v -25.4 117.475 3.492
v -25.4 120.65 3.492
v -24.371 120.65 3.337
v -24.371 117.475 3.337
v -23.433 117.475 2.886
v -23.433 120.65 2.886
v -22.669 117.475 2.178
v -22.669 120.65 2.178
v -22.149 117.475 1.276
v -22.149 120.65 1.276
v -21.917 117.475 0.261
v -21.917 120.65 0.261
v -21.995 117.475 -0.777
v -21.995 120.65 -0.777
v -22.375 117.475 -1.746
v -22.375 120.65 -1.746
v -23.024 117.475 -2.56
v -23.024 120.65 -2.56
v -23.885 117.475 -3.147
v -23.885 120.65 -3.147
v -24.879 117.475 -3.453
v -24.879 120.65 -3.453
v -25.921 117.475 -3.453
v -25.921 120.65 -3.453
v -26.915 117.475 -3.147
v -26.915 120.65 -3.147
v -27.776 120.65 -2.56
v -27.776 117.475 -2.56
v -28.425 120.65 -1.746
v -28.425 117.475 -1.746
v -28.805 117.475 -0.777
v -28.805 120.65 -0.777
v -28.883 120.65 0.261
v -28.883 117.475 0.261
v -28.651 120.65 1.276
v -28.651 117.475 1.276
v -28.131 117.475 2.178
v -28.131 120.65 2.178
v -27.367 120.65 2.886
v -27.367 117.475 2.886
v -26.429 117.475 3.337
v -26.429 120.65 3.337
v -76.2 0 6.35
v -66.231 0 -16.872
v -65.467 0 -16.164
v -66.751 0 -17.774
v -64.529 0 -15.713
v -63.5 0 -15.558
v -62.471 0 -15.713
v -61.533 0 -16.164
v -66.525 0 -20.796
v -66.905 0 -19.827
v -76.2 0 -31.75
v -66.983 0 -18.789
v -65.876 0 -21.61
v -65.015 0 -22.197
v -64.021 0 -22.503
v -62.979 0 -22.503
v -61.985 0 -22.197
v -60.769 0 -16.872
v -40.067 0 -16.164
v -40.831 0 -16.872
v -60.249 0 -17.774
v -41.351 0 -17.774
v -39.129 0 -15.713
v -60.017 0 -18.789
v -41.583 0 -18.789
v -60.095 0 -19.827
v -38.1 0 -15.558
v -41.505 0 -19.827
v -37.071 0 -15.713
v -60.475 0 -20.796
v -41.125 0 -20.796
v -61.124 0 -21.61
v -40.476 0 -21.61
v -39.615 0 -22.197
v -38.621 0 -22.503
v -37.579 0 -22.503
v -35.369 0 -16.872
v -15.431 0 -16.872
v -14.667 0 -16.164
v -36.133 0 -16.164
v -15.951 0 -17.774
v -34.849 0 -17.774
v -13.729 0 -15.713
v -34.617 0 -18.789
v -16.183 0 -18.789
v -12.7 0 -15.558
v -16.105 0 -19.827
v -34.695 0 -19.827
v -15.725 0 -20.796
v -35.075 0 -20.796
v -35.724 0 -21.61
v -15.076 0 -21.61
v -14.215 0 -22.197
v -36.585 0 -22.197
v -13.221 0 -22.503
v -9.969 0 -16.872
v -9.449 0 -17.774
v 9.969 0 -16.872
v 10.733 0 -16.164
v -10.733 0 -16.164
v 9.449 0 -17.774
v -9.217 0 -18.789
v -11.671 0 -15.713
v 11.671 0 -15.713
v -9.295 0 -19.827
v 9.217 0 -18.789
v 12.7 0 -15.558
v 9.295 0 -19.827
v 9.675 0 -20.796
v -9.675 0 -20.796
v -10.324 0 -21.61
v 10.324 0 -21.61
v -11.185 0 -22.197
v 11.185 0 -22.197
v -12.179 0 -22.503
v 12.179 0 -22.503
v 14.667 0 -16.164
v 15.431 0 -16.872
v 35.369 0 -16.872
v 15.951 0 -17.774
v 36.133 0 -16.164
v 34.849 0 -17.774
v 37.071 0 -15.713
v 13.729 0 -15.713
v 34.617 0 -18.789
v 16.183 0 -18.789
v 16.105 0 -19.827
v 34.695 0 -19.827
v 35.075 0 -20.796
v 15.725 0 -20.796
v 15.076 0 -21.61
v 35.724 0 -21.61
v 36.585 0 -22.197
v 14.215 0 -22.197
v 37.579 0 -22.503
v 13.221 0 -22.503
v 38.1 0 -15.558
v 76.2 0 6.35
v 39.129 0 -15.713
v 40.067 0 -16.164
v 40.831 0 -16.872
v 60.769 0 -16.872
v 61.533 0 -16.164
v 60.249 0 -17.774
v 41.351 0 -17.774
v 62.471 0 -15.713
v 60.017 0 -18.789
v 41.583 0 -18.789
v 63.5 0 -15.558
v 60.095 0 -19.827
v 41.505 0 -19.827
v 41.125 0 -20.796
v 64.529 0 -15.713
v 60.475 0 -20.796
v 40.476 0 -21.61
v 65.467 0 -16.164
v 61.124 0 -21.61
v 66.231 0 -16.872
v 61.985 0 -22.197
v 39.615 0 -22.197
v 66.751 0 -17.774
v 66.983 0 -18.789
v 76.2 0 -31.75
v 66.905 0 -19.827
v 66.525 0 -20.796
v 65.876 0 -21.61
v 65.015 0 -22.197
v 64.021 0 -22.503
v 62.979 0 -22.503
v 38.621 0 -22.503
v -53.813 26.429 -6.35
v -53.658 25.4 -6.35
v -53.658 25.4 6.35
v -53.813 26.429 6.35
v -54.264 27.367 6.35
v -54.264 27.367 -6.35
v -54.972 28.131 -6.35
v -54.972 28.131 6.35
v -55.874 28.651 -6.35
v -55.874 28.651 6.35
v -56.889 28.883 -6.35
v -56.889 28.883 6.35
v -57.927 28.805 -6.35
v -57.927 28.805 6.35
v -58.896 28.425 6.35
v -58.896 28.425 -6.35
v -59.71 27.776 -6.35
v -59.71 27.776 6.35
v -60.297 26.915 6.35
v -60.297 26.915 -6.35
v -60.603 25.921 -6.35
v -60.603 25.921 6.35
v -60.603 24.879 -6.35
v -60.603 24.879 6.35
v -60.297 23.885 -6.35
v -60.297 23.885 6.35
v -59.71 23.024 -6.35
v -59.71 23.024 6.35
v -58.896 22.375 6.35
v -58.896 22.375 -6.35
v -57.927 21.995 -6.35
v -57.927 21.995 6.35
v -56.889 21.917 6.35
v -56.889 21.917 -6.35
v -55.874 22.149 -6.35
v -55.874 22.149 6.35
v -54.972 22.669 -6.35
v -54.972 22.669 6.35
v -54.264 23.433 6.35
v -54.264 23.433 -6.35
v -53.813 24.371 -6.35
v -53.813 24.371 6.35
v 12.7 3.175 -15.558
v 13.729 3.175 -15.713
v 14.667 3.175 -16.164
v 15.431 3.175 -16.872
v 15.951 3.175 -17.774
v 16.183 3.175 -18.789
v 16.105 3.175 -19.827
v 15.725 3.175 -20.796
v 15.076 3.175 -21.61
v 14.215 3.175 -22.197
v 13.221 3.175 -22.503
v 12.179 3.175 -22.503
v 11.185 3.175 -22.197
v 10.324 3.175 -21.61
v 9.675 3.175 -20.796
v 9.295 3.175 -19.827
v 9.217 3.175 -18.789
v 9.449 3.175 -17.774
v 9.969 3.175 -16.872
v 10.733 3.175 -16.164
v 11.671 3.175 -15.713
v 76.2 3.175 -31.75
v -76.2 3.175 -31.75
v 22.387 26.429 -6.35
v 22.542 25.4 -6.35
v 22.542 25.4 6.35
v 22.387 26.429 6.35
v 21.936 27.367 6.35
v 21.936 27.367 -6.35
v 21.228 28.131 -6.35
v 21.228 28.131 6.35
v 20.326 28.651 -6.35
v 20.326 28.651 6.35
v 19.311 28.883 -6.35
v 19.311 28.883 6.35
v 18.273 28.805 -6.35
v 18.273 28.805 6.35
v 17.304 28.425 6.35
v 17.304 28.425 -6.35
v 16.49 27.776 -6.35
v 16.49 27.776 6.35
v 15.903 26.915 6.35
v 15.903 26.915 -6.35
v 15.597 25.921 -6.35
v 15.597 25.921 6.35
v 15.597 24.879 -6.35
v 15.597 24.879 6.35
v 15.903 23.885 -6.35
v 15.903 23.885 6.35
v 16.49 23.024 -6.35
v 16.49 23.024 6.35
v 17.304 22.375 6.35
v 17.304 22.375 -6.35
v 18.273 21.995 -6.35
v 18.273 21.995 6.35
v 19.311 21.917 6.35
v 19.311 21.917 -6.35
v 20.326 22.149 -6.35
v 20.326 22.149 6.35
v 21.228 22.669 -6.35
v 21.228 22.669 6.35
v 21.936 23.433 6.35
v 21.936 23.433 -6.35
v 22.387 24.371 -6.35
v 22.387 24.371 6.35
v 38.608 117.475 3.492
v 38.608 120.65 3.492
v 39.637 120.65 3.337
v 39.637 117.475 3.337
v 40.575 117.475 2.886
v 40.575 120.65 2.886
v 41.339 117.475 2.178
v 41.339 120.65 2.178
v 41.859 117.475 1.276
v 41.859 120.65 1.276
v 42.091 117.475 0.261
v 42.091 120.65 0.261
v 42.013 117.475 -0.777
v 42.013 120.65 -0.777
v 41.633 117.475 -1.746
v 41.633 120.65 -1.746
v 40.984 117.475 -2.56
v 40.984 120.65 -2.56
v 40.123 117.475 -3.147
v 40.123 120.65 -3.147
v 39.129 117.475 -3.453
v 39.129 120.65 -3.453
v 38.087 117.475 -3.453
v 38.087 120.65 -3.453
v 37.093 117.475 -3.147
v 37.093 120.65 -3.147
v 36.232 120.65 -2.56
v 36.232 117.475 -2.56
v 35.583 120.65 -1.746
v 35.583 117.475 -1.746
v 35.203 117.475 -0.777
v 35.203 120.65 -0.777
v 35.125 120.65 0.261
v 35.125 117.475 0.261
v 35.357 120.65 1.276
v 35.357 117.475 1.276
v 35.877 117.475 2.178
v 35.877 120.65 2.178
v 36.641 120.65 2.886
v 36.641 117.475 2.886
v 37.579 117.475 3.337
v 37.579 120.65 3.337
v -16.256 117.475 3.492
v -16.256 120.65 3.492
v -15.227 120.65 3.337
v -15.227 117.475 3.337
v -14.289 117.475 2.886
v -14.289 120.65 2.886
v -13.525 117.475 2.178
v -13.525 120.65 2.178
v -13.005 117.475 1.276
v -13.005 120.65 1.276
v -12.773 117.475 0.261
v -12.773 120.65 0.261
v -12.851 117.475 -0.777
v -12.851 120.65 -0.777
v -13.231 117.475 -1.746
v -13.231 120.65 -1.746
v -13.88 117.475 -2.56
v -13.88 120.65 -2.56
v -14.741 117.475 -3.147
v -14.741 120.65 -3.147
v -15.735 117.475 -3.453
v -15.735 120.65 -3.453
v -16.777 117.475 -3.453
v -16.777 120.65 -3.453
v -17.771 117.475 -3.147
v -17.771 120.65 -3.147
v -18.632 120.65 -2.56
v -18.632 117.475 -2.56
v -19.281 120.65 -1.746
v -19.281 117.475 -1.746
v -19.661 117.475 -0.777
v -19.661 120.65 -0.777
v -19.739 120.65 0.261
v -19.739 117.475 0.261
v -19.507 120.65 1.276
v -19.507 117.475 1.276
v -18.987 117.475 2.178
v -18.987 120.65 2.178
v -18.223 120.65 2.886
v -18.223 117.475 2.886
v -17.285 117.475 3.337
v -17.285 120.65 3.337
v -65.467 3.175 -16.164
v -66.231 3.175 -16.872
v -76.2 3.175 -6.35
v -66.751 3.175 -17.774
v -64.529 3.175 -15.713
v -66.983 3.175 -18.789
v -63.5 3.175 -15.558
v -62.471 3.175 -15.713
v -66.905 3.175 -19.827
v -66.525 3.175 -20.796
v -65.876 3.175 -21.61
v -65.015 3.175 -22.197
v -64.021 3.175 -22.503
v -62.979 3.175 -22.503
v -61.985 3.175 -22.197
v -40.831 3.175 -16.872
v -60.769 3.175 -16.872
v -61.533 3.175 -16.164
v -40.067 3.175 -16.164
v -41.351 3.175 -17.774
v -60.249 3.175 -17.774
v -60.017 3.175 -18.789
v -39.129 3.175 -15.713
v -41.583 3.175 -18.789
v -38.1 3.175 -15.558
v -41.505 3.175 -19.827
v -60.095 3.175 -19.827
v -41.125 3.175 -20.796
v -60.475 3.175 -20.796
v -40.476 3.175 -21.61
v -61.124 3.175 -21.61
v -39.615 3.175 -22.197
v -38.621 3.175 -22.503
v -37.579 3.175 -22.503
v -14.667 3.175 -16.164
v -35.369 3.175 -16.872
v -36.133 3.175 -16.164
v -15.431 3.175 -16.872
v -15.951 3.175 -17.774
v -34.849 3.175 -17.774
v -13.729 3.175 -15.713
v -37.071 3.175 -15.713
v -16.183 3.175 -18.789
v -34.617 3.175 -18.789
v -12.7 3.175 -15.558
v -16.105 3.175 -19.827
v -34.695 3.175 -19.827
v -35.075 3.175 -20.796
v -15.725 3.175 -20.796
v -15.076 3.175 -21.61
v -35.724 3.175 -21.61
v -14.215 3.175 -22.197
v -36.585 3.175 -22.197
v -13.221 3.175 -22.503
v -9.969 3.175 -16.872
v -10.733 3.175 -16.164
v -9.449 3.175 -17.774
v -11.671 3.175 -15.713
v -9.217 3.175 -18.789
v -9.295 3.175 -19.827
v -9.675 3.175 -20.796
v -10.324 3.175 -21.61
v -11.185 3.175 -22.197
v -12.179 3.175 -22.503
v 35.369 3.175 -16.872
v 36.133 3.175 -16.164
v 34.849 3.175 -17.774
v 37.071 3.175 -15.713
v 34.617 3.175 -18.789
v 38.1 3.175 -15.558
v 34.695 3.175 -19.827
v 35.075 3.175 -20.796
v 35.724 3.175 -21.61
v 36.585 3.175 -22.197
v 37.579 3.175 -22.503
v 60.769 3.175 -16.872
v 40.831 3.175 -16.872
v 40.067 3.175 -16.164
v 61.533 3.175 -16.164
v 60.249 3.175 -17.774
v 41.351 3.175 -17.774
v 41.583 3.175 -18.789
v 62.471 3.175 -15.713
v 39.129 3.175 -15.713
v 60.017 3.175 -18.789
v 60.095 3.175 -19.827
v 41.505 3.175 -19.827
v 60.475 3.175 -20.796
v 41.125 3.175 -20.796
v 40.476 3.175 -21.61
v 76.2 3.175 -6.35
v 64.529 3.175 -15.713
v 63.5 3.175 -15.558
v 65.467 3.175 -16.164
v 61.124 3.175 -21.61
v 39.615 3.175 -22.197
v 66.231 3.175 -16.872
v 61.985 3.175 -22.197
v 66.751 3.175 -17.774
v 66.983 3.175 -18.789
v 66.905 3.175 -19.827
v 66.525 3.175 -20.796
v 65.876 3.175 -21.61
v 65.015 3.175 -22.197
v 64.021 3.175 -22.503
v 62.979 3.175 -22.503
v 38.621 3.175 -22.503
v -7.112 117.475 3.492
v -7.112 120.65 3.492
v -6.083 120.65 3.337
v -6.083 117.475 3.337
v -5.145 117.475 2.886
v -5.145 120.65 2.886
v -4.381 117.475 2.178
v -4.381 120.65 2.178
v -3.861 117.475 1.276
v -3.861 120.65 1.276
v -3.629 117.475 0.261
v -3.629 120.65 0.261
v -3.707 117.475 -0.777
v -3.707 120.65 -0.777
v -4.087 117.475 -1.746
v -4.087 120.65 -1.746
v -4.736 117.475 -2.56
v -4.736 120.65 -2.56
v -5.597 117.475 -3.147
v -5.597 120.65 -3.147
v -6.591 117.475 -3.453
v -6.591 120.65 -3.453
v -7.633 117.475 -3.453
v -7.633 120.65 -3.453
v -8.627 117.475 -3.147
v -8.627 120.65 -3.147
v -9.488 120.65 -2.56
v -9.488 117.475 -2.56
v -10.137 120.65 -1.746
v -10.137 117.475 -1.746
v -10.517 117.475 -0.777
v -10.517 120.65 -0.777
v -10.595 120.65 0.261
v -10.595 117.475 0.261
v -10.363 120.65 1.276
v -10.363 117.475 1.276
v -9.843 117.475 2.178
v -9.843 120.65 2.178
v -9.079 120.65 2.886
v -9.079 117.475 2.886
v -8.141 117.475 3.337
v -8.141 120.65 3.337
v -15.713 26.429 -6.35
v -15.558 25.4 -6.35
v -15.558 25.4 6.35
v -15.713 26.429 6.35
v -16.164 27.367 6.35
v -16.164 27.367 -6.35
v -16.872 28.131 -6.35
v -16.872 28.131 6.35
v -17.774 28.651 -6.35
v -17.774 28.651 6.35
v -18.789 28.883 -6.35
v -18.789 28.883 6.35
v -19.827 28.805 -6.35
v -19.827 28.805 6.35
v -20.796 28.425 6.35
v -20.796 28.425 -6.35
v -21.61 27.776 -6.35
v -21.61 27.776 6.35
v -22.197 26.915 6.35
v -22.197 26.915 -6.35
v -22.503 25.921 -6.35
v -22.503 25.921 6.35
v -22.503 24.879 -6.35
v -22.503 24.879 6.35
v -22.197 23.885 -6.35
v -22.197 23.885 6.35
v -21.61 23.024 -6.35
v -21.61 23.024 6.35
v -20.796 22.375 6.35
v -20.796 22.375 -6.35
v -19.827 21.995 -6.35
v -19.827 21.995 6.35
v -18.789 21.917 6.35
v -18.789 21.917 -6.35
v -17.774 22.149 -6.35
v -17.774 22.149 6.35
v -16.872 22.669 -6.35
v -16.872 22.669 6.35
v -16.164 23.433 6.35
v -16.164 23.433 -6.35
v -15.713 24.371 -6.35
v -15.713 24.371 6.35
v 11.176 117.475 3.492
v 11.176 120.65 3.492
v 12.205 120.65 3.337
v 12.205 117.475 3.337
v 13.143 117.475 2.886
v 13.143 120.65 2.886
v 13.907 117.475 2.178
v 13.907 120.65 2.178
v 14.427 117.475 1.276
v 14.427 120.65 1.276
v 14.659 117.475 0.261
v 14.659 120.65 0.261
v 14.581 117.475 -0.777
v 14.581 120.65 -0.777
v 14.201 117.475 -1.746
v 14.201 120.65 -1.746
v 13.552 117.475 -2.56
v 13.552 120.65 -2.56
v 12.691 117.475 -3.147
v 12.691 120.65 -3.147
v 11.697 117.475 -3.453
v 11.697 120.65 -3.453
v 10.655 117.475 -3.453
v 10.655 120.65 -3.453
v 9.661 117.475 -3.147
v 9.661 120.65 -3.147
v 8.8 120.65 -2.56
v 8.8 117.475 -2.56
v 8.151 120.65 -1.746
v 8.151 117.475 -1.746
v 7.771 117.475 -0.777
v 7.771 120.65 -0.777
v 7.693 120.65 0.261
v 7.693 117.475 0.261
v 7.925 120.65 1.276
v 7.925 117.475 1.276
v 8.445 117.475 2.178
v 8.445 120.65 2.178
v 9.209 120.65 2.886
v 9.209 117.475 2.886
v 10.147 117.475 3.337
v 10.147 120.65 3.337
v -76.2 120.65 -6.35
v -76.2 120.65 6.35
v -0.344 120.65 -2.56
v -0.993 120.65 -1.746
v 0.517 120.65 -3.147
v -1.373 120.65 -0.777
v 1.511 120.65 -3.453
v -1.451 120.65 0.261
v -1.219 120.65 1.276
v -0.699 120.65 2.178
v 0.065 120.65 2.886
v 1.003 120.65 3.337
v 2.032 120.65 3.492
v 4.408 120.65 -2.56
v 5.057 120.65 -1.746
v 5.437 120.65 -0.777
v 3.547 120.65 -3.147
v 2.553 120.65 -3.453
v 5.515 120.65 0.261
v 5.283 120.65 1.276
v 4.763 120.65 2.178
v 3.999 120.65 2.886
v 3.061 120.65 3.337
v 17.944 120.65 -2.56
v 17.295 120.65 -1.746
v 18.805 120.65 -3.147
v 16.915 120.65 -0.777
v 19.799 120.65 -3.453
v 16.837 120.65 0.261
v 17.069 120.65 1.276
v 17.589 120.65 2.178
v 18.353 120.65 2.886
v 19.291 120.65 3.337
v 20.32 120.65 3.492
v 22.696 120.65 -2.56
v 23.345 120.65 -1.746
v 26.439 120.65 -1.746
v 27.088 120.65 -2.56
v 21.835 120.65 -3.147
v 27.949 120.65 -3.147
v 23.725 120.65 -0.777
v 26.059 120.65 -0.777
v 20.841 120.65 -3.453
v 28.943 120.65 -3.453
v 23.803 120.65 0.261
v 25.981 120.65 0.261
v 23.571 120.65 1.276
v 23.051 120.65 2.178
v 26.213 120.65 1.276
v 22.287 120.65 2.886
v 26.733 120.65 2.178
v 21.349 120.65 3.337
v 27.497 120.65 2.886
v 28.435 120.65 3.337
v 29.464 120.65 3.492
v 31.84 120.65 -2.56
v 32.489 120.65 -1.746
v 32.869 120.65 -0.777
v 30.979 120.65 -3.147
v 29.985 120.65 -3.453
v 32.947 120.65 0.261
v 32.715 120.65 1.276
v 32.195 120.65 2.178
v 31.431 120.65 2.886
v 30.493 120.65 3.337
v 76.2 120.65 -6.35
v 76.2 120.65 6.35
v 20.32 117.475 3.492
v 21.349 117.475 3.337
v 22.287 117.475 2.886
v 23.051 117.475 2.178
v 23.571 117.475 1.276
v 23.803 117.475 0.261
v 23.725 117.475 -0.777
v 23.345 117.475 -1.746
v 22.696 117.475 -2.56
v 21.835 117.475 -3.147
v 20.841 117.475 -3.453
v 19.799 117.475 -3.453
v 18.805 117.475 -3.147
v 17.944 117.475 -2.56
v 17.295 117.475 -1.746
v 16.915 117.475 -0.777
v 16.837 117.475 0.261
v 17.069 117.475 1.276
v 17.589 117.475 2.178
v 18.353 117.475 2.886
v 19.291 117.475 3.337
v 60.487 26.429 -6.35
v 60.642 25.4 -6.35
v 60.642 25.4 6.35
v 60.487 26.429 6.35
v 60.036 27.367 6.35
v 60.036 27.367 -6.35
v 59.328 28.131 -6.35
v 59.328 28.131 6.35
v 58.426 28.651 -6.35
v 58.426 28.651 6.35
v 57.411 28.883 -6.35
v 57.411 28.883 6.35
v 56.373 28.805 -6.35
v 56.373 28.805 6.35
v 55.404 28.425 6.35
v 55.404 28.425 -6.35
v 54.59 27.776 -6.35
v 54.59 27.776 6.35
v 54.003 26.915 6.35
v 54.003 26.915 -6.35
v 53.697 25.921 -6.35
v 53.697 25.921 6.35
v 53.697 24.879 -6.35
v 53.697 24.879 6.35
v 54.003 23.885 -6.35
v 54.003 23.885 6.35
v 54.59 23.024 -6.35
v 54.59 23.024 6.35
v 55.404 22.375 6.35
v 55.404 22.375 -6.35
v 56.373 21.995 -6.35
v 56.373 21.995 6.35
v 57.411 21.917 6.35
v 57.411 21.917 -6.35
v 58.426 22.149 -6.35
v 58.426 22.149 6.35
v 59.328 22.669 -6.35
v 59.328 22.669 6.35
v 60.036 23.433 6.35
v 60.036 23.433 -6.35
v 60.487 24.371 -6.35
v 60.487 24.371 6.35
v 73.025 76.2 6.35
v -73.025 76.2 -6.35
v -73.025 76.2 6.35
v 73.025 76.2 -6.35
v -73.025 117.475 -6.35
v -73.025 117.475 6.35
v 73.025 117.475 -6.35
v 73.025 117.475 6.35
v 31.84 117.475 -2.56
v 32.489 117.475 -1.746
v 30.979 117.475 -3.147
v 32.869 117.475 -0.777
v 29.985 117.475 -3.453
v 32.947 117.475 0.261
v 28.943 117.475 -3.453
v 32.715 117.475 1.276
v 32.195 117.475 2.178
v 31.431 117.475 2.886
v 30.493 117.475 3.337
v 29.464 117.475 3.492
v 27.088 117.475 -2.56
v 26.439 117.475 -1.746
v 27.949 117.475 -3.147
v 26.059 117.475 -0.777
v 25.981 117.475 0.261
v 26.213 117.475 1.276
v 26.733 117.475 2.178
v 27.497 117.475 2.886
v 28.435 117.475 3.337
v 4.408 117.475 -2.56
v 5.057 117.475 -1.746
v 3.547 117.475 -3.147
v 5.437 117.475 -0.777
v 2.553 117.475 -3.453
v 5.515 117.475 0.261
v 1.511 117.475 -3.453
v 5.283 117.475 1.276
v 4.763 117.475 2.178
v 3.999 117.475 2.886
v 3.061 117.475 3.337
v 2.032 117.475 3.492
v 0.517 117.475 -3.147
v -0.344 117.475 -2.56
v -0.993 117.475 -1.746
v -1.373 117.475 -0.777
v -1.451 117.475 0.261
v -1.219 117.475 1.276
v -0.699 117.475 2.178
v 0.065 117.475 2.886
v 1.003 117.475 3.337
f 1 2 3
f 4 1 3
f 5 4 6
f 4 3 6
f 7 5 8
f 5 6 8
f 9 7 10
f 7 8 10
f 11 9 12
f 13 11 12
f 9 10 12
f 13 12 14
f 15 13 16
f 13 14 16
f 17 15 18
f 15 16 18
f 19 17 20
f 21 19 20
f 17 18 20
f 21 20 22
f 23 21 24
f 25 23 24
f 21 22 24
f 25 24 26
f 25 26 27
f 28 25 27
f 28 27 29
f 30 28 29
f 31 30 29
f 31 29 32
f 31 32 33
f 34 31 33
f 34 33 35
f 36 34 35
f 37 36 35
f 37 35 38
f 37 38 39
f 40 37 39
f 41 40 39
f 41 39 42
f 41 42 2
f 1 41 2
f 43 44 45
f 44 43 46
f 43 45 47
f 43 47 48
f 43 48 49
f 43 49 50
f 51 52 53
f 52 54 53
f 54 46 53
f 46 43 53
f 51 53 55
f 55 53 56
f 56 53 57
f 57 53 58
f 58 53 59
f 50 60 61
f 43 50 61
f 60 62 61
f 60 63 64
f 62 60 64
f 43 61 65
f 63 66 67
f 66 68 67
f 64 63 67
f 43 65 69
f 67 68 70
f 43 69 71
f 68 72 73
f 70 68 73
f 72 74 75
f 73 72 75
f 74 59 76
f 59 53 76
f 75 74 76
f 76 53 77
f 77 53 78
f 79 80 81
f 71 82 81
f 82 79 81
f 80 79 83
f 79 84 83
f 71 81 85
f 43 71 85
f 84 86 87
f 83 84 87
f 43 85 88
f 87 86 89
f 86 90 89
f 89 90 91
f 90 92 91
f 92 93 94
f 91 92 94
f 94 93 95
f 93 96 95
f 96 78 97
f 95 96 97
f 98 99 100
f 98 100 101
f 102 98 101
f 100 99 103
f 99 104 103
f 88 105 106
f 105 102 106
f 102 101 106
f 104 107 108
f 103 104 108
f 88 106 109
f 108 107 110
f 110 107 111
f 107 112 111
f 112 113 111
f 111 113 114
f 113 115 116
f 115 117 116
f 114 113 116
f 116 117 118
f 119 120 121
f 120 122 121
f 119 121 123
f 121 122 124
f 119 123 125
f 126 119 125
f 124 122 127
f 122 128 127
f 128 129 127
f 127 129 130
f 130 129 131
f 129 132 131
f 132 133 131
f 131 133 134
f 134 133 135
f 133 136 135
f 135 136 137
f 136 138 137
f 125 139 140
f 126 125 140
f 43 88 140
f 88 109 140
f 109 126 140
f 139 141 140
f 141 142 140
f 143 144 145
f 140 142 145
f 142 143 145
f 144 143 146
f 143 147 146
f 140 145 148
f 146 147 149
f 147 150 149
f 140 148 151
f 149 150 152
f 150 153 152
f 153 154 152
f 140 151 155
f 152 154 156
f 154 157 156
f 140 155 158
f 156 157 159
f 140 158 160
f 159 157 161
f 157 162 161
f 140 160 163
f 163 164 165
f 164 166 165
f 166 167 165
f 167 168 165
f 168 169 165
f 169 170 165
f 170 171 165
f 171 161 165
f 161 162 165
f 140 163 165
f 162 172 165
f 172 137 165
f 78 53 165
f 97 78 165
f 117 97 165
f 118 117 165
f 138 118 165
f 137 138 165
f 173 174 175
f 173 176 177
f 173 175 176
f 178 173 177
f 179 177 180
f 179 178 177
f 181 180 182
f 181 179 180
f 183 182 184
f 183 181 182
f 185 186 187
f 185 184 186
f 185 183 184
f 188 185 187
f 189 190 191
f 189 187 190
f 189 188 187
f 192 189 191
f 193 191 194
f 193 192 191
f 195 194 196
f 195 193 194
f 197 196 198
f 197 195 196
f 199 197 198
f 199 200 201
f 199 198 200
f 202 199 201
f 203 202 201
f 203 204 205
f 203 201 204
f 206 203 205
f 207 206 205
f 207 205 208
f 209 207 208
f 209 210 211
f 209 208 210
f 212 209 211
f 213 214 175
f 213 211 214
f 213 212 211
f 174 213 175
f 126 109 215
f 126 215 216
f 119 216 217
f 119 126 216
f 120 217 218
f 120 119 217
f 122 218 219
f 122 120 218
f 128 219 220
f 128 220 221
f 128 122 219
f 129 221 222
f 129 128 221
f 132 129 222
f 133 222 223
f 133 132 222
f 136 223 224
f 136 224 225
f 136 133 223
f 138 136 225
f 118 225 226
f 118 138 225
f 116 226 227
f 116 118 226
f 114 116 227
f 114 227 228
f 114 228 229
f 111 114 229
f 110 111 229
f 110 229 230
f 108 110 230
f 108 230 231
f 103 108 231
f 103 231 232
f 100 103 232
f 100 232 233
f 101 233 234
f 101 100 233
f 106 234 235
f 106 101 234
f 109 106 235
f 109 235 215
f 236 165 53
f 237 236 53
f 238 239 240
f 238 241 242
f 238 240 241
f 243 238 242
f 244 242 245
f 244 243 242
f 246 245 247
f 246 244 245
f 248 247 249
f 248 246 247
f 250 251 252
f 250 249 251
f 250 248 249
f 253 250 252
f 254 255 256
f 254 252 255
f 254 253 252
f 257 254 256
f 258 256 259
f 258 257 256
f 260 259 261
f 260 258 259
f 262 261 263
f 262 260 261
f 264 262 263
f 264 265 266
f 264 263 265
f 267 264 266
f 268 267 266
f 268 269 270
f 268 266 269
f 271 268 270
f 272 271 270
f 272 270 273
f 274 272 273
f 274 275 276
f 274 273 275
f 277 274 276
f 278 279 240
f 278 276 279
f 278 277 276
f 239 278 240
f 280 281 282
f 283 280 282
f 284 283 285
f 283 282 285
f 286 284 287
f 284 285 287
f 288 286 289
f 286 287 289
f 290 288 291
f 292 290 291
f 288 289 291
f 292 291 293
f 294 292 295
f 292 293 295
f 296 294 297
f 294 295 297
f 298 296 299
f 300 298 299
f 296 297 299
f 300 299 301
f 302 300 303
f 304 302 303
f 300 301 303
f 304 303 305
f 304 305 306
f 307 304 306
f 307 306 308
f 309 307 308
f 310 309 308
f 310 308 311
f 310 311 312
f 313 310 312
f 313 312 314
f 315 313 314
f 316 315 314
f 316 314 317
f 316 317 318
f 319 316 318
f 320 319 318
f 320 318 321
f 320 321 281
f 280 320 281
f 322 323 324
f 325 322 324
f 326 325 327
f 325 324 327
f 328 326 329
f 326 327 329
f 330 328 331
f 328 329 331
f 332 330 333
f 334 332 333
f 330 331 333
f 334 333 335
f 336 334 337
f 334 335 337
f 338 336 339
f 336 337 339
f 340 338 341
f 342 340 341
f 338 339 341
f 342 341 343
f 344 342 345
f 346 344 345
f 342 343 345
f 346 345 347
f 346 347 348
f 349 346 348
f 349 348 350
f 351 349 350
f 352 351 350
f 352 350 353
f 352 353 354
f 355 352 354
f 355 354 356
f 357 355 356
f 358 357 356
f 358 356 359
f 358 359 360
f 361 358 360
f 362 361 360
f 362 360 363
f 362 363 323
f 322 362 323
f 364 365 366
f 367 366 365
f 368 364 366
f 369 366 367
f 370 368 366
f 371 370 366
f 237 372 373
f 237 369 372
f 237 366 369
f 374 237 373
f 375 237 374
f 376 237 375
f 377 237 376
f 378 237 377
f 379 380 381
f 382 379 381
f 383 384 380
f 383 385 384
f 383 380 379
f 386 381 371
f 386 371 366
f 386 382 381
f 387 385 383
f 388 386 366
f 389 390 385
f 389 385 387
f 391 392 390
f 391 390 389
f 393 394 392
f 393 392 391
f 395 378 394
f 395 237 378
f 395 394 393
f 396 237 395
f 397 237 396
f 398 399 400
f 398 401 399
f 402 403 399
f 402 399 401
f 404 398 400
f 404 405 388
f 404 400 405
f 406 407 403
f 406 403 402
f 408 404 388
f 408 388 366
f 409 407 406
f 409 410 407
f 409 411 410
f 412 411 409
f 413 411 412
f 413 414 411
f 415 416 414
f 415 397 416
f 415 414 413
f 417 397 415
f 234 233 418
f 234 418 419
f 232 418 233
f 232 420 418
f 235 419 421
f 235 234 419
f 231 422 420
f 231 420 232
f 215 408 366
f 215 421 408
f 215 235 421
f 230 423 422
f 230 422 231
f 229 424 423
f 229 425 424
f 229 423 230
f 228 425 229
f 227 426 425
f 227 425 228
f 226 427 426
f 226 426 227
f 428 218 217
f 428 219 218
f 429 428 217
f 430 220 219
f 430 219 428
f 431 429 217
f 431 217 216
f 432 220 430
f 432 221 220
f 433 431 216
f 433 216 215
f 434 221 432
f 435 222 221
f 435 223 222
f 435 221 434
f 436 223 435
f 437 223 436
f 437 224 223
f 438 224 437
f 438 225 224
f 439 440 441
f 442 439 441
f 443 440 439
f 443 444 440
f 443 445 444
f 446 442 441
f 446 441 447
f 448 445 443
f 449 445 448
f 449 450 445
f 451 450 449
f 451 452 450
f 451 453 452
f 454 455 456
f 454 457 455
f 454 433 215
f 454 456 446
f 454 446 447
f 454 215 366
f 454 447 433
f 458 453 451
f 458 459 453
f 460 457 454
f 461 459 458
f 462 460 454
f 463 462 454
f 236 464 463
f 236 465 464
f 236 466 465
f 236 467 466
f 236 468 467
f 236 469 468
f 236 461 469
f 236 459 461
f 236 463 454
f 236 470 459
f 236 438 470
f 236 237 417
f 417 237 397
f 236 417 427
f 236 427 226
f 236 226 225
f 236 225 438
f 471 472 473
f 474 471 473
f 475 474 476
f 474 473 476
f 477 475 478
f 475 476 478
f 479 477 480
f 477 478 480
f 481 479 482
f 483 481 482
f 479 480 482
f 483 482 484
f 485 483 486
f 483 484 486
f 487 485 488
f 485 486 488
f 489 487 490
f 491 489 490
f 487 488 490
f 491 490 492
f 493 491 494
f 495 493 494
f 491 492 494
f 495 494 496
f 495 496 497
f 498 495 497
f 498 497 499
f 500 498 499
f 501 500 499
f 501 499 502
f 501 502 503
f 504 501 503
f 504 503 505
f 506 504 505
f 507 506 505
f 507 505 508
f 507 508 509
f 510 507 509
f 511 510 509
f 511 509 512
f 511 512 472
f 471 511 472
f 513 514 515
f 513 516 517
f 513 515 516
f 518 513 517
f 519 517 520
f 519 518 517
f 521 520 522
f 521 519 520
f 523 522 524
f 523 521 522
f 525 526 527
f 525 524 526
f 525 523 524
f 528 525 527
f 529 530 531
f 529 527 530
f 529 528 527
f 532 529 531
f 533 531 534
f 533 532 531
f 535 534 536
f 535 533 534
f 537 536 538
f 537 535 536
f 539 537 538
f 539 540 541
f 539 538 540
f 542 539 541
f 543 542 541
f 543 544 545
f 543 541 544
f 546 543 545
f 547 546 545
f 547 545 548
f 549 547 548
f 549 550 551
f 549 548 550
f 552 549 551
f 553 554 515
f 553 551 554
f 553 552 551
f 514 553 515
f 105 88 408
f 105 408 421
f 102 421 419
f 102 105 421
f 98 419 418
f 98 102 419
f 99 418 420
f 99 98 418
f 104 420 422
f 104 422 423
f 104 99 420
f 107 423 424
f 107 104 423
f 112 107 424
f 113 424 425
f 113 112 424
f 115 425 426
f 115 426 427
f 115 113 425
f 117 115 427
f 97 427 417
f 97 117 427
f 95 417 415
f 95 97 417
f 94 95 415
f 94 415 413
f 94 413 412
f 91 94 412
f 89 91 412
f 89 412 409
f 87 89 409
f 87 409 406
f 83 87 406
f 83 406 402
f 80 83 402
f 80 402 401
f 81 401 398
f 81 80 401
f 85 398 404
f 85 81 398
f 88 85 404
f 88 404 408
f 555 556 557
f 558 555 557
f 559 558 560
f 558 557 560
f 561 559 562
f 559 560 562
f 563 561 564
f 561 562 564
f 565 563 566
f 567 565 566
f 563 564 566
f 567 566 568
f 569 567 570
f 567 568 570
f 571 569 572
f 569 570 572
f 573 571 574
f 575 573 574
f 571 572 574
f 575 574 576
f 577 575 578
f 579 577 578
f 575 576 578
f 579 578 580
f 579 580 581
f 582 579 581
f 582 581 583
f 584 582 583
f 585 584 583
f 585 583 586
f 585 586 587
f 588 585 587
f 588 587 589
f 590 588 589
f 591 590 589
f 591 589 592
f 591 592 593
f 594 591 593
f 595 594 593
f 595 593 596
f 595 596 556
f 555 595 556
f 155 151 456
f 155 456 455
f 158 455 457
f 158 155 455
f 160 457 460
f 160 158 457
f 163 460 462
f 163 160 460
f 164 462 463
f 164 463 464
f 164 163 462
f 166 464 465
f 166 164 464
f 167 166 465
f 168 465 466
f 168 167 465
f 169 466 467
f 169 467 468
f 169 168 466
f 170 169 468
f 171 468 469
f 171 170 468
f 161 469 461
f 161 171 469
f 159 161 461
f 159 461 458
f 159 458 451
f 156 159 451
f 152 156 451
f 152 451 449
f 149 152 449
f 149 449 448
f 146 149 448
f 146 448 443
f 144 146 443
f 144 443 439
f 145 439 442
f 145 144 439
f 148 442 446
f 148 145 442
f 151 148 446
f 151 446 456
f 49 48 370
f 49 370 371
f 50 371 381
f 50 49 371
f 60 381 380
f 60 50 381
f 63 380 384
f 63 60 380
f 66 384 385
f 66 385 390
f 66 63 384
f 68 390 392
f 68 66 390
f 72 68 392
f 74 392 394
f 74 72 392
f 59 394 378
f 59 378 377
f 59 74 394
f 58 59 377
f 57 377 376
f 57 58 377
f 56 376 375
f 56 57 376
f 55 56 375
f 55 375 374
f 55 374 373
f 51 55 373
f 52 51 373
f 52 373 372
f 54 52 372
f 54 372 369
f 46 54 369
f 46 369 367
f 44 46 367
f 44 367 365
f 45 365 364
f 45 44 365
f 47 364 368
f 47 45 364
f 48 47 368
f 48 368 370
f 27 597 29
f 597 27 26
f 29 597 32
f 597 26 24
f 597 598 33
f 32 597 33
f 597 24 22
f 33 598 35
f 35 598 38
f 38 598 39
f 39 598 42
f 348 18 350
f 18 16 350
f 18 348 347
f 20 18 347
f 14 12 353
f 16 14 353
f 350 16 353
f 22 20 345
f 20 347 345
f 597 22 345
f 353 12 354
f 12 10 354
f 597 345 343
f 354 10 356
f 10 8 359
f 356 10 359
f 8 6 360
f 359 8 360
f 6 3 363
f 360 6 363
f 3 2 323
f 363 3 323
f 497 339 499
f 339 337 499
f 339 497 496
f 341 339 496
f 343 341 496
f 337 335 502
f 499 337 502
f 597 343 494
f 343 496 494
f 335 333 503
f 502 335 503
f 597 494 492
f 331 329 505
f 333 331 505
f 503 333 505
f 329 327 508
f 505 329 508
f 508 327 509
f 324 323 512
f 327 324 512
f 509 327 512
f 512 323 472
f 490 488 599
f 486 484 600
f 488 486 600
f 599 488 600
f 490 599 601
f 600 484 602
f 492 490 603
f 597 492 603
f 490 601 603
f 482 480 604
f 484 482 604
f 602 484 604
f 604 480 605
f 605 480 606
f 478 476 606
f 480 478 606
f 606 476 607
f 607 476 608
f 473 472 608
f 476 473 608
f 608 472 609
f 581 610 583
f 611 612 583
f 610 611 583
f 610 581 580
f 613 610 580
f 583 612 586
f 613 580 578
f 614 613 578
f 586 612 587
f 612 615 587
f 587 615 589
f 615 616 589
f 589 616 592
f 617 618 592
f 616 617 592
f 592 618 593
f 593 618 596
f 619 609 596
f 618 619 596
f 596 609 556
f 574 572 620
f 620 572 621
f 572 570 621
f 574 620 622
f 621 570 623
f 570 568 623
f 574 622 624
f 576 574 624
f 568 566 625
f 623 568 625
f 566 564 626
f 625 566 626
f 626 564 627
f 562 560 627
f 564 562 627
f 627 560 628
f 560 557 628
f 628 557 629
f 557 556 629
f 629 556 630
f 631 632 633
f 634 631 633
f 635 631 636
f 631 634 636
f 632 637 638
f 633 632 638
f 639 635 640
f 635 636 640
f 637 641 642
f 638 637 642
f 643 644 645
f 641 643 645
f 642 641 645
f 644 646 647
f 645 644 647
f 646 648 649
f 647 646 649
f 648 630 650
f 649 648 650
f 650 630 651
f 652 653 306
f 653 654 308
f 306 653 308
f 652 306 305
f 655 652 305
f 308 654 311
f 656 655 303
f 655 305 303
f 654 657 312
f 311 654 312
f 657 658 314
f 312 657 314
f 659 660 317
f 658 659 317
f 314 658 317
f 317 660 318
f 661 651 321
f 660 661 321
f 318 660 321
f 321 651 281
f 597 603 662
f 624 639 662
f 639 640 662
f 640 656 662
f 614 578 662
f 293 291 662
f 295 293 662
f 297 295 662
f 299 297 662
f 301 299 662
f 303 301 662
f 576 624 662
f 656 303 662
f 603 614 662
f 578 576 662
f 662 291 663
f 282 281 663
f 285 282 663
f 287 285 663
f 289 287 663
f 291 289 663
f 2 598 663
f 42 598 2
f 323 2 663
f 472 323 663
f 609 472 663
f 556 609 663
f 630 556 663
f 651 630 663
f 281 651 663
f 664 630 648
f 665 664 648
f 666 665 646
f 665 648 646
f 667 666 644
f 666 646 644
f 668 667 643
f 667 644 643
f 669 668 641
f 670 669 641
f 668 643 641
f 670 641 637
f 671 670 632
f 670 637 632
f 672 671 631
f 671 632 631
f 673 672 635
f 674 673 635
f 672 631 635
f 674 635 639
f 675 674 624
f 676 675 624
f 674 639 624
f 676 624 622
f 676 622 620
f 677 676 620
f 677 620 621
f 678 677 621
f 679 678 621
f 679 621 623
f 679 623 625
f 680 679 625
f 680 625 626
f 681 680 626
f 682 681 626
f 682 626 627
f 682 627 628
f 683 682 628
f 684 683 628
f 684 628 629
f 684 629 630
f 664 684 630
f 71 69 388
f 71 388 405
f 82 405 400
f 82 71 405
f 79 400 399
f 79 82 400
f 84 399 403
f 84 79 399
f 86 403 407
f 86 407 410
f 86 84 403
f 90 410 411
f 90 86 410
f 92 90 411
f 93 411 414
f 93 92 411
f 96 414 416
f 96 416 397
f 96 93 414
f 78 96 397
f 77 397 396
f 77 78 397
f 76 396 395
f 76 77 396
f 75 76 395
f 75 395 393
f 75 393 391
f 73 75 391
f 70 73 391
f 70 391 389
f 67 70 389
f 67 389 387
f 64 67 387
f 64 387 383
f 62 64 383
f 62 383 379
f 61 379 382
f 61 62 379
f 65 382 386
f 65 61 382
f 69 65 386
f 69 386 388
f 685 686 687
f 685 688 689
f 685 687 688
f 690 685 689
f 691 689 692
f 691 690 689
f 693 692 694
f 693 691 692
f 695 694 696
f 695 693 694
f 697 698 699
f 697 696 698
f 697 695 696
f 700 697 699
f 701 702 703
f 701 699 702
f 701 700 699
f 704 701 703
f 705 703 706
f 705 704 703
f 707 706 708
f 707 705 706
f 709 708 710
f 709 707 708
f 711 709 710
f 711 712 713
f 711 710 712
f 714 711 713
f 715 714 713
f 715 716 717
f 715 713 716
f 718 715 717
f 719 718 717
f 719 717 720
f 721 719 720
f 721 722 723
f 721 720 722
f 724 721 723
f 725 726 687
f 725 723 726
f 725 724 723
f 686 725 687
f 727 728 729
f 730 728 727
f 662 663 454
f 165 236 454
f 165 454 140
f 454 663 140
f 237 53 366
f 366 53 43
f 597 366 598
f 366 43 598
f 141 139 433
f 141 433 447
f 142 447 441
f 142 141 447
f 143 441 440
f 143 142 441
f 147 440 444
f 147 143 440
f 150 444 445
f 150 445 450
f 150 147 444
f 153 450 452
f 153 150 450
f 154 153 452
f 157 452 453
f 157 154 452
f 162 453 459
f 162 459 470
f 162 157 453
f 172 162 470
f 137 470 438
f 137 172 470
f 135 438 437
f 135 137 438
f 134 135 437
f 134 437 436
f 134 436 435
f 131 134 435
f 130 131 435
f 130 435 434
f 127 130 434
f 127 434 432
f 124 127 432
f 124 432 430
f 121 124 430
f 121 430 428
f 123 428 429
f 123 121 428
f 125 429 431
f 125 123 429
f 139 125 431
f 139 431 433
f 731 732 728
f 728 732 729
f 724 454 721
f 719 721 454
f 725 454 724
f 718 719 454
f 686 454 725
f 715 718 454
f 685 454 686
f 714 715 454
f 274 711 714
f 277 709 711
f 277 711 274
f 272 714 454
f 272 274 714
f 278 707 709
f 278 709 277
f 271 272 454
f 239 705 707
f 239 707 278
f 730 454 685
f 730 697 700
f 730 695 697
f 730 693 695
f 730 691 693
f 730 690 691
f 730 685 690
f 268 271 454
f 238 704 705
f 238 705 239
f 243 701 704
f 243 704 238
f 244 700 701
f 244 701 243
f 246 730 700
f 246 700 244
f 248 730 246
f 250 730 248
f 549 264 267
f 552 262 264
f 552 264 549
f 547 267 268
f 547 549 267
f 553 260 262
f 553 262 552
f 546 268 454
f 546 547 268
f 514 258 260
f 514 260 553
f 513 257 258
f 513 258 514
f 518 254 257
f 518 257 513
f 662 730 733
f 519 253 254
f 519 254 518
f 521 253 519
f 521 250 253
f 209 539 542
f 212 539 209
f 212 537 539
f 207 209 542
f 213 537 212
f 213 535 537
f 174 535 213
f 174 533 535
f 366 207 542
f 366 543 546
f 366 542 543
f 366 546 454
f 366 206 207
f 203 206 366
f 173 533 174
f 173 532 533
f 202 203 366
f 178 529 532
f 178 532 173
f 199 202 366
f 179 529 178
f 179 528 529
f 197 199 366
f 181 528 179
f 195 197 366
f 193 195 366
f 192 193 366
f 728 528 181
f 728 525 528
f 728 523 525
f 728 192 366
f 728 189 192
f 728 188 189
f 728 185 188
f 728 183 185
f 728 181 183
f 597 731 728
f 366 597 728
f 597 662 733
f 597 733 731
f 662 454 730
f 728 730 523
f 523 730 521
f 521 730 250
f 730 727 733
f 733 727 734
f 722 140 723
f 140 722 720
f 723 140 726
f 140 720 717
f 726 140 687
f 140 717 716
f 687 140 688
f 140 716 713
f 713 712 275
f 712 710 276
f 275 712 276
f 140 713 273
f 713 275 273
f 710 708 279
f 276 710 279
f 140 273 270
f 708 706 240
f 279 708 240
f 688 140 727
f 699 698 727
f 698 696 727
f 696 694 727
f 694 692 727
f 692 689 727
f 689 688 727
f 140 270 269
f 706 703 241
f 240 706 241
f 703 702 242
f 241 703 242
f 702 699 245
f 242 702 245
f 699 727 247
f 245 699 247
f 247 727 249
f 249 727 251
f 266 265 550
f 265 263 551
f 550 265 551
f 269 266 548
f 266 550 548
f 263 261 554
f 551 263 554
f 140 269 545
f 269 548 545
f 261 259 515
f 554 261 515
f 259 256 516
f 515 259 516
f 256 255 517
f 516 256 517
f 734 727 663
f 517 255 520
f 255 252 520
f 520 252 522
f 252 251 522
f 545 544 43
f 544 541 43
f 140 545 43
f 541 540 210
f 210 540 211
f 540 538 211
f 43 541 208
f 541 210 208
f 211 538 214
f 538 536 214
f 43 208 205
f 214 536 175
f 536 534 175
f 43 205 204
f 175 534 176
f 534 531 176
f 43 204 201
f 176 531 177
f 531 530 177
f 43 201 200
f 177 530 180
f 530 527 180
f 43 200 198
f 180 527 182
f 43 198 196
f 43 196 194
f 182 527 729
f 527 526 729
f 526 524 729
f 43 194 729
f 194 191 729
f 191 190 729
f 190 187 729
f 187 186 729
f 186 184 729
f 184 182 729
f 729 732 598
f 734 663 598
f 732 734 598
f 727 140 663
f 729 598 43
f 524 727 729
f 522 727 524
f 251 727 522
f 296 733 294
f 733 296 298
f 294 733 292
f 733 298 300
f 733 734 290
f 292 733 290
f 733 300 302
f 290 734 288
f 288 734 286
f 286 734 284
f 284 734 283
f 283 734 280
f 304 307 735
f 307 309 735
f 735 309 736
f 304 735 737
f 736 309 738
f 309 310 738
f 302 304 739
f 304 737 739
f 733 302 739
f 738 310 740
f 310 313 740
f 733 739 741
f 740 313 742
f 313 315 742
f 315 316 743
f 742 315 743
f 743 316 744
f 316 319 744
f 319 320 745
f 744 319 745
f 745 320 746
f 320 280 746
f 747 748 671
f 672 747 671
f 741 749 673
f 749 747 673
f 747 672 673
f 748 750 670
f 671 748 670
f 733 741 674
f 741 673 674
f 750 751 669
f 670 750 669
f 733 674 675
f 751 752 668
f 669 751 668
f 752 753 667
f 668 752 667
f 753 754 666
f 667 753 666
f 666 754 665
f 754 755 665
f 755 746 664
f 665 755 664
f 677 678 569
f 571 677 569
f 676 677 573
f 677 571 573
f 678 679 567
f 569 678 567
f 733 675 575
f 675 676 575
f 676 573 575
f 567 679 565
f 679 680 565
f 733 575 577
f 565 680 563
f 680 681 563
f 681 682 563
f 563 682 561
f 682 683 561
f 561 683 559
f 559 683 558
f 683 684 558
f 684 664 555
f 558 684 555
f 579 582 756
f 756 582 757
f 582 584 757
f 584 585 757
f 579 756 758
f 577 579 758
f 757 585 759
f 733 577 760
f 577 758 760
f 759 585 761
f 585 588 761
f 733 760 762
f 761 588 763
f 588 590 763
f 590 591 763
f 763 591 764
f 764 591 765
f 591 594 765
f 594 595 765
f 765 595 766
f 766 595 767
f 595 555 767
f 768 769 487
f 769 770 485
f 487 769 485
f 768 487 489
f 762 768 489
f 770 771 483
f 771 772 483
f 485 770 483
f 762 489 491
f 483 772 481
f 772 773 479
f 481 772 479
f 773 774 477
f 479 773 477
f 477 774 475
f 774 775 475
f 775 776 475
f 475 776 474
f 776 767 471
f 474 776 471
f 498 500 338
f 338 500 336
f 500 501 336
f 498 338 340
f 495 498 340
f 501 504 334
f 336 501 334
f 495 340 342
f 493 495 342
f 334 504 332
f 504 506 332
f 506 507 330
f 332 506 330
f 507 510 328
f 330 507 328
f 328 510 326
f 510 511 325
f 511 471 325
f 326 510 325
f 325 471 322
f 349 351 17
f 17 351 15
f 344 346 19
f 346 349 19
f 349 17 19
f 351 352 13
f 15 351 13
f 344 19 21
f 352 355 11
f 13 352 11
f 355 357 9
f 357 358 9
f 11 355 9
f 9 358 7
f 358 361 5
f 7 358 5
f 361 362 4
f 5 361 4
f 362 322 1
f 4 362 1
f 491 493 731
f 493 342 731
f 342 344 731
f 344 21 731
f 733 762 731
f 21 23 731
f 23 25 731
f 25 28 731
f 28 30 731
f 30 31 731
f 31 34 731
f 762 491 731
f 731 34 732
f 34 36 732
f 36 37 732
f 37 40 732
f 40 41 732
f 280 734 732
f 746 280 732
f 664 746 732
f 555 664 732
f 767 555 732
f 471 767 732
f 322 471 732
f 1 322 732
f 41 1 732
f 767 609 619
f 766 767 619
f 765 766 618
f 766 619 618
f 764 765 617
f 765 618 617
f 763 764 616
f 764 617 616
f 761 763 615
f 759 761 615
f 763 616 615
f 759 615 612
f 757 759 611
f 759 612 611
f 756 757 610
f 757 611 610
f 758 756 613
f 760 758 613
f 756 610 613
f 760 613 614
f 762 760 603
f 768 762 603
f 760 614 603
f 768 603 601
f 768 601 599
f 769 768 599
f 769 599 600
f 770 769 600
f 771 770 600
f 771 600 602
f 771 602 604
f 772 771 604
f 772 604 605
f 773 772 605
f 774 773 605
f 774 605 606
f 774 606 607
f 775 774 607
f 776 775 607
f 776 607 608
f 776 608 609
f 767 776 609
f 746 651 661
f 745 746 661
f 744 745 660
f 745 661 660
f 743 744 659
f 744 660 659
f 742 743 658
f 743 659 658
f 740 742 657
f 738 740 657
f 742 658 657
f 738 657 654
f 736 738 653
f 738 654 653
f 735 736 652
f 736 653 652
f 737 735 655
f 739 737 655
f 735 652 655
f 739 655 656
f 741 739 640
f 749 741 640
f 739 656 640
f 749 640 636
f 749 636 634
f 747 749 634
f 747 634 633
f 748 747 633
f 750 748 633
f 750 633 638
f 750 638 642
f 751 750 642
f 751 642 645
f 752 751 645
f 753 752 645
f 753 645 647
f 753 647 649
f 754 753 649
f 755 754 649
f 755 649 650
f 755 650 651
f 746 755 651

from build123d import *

# Parameters (mm, degrees)
SKETCH1_W               = 152.4
SKETCH1_H               = 12.7
BOSS_EXTRUDE1_DEPTH     = 76.2
SKETCH2_R               = 3.4925
BOSS_EXTRUDE4_DEPTH     = 3.175
BOSS_EXTRUDE5_DEPTH     = 12.7
CUT_EXTRUDE1_REACH      = 148.188
SKETCH4_R               = 3.4925
CUT_EXTRUDE2_DEPTH      = 147.187978302
CUT_EXTRUDE2_DEPTH_BACK = 147.187978302
SKETCH5_R               = 3.4925


with BuildPart() as part:
    # Sketch1 → Boss-Extrude1 (new body)
    with BuildSketch(Plane(origin=(0, 0, 0), x_dir=(1, 0, 0), z_dir=(0, 1, 0))):
        Rectangle(SKETCH1_W, SKETCH1_H)
    extrude(amount=BOSS_EXTRUDE1_DEPTH)

    # Sketch2 → Boss-Extrude4 (add)
    with BuildSketch(Plane(origin=(0, 0, 0), x_dir=(1, 0, 0), z_dir=(0, 1, 0))):
        Polygon((-76.2, 19.05), (-76.2, 6.35), (76.2, 6.35), (76.2, 31.75), (-76.2, 31.75), align=None)
        with Locations(Location((-63.5, 19.05, 0), (0, 0, 270))):
            Circle(SKETCH2_R, mode=Mode.SUBTRACT)
        with Locations(Location((-38.1, 19.05, 0), (0, 0, 270))):
            Circle(SKETCH2_R, mode=Mode.SUBTRACT)
        with Locations(Location((-12.7, 19.05, 0), (0, 0, 270))):
            Circle(SKETCH2_R, mode=Mode.SUBTRACT)
        with Locations(Location((12.7, 19.05, 0), (0, 0, 270))):
            Circle(SKETCH2_R, mode=Mode.SUBTRACT)
        with Locations(Location((38.1, 19.05, 0), (0, 0, 270))):
            Circle(SKETCH2_R, mode=Mode.SUBTRACT)
        with Locations(Location((63.5, 19.05, 0), (0, 0, 270))):
            Circle(SKETCH2_R, mode=Mode.SUBTRACT)
    extrude(amount=BOSS_EXTRUDE4_DEPTH)

    # Sketch3 → Boss-Extrude5 (add)
    with BuildSketch(Plane.XY.offset(6.35)):
        Polygon((-76.2, 76.2), (-76.2, 120.65), (76.2, 120.65), (76.2, 76.2), (73.025, 76.2), (73.025, 117.475), (-73.025, 117.475), (-73.025, 76.2), align=None)
    extrude(amount=-BOSS_EXTRUDE5_DEPTH)

    # Sketch4 → Cut-Extrude1 (cut, up to next)
    with BuildSketch(Plane(origin=(0, 120.65, 0), x_dir=(1, 0, 0), z_dir=(0, 1, 0)), mode=Mode.PRIVATE) as cut_extrude1_sk1:
        with Locations(Location((-25.4, 0, 0), (0, 0, 270))):
            Circle(SKETCH4_R)
    cut_extrude1_tool1 = extrude(cut_extrude1_sk1.sketch, amount=-CUT_EXTRUDE1_REACH, mode=Mode.PRIVATE) & part.part
    # Sketch4 → Cut-Extrude1 (cut, up to next)
    with BuildSketch(Plane(origin=(0, 120.65, 0), x_dir=(1, 0, 0), z_dir=(0, 1, 0)), mode=Mode.PRIVATE) as cut_extrude1_sk2:
        with Locations(Location((-16.256, 0, 0), (0, 0, 270))):
            Circle(SKETCH4_R)
    cut_extrude1_tool2 = extrude(cut_extrude1_sk2.sketch, amount=-CUT_EXTRUDE1_REACH, mode=Mode.PRIVATE) & part.part
    # Sketch4 → Cut-Extrude1 (cut, up to next)
    with BuildSketch(Plane(origin=(0, 120.65, 0), x_dir=(1, 0, 0), z_dir=(0, 1, 0)), mode=Mode.PRIVATE) as cut_extrude1_sk3:
        with Locations(Location((-7.112, 0, 0), (0, 0, 270))):
            Circle(SKETCH4_R)
    cut_extrude1_tool3 = extrude(cut_extrude1_sk3.sketch, amount=-CUT_EXTRUDE1_REACH, mode=Mode.PRIVATE) & part.part
    # Sketch4 → Cut-Extrude1 (cut, up to next)
    with BuildSketch(Plane(origin=(0, 120.65, 0), x_dir=(1, 0, 0), z_dir=(0, 1, 0)), mode=Mode.PRIVATE) as cut_extrude1_sk4:
        with Locations(Location((2.032, 0, 0), (0, 0, 270))):
            Circle(SKETCH4_R)
    cut_extrude1_tool4 = extrude(cut_extrude1_sk4.sketch, amount=-CUT_EXTRUDE1_REACH, mode=Mode.PRIVATE) & part.part
    # Sketch4 → Cut-Extrude1 (cut, up to next)
    with BuildSketch(Plane(origin=(0, 120.65, 0), x_dir=(1, 0, 0), z_dir=(0, 1, 0)), mode=Mode.PRIVATE) as cut_extrude1_sk5:
        with Locations(Location((11.176, 0, 0), (0, 0, 270))):
            Circle(SKETCH4_R)
    cut_extrude1_tool5 = extrude(cut_extrude1_sk5.sketch, amount=-CUT_EXTRUDE1_REACH, mode=Mode.PRIVATE) & part.part
    # Sketch4 → Cut-Extrude1 (cut, up to next)
    with BuildSketch(Plane(origin=(0, 120.65, 0), x_dir=(1, 0, 0), z_dir=(0, 1, 0)), mode=Mode.PRIVATE) as cut_extrude1_sk6:
        with Locations(Location((20.32, 0, 0), (0, 0, 270))):
            Circle(SKETCH4_R)
    cut_extrude1_tool6 = extrude(cut_extrude1_sk6.sketch, amount=-CUT_EXTRUDE1_REACH, mode=Mode.PRIVATE) & part.part
    # Sketch4 → Cut-Extrude1 (cut, up to next)
    with BuildSketch(Plane(origin=(0, 120.65, 0), x_dir=(1, 0, 0), z_dir=(0, 1, 0)), mode=Mode.PRIVATE) as cut_extrude1_sk7:
        with Locations(Location((29.464, 0, 0), (0, 0, 270))):
            Circle(SKETCH4_R)
    cut_extrude1_tool7 = extrude(cut_extrude1_sk7.sketch, amount=-CUT_EXTRUDE1_REACH, mode=Mode.PRIVATE) & part.part
    # Sketch4 → Cut-Extrude1 (cut, up to next)
    with BuildSketch(Plane(origin=(0, 120.65, 0), x_dir=(1, 0, 0), z_dir=(0, 1, 0)), mode=Mode.PRIVATE) as cut_extrude1_sk8:
        with Locations(Location((38.608, 0, 0), (0, 0, 270))):
            Circle(SKETCH4_R)
    cut_extrude1_tool8 = extrude(cut_extrude1_sk8.sketch, amount=-CUT_EXTRUDE1_REACH, mode=Mode.PRIVATE) & part.part
    add(cut_extrude1_tool1.solids().sort_by_distance((-25.4, 120.65, 0))[0], mode=Mode.SUBTRACT)
    add(cut_extrude1_tool2.solids().sort_by_distance((-16.256, 120.65, 0))[0], mode=Mode.SUBTRACT)
    add(cut_extrude1_tool3.solids().sort_by_distance((-7.112, 120.65, 0))[0], mode=Mode.SUBTRACT)
    add(cut_extrude1_tool4.solids().sort_by_distance((2.032, 120.65, 0))[0], mode=Mode.SUBTRACT)
    add(cut_extrude1_tool5.solids().sort_by_distance((11.176, 120.65, 0))[0], mode=Mode.SUBTRACT)
    add(cut_extrude1_tool6.solids().sort_by_distance((20.32, 120.65, 0))[0], mode=Mode.SUBTRACT)
    add(cut_extrude1_tool7.solids().sort_by_distance((29.464, 120.65, 0))[0], mode=Mode.SUBTRACT)
    add(cut_extrude1_tool8.solids().sort_by_distance((38.608, 120.65, 0))[0], mode=Mode.SUBTRACT)

    # Sketch5 → Cut-Extrude2 (cut, two sides: drawn at the far end of the back side and taken through both)
    with BuildSketch(Plane.XY.offset(-CUT_EXTRUDE2_DEPTH_BACK)):
        with Locations((-57.15, 25.4)):
            Circle(SKETCH5_R)
        with Locations((-19.05, 25.4)):
            Circle(SKETCH5_R)
        with Locations((19.05, 25.4)):
            Circle(SKETCH5_R)
        with Locations((57.15, 25.4)):
            Circle(SKETCH5_R)
    extrude(amount=CUT_EXTRUDE2_DEPTH + CUT_EXTRUDE2_DEPTH_BACK, mode=Mode.SUBTRACT)


solid = part.part
